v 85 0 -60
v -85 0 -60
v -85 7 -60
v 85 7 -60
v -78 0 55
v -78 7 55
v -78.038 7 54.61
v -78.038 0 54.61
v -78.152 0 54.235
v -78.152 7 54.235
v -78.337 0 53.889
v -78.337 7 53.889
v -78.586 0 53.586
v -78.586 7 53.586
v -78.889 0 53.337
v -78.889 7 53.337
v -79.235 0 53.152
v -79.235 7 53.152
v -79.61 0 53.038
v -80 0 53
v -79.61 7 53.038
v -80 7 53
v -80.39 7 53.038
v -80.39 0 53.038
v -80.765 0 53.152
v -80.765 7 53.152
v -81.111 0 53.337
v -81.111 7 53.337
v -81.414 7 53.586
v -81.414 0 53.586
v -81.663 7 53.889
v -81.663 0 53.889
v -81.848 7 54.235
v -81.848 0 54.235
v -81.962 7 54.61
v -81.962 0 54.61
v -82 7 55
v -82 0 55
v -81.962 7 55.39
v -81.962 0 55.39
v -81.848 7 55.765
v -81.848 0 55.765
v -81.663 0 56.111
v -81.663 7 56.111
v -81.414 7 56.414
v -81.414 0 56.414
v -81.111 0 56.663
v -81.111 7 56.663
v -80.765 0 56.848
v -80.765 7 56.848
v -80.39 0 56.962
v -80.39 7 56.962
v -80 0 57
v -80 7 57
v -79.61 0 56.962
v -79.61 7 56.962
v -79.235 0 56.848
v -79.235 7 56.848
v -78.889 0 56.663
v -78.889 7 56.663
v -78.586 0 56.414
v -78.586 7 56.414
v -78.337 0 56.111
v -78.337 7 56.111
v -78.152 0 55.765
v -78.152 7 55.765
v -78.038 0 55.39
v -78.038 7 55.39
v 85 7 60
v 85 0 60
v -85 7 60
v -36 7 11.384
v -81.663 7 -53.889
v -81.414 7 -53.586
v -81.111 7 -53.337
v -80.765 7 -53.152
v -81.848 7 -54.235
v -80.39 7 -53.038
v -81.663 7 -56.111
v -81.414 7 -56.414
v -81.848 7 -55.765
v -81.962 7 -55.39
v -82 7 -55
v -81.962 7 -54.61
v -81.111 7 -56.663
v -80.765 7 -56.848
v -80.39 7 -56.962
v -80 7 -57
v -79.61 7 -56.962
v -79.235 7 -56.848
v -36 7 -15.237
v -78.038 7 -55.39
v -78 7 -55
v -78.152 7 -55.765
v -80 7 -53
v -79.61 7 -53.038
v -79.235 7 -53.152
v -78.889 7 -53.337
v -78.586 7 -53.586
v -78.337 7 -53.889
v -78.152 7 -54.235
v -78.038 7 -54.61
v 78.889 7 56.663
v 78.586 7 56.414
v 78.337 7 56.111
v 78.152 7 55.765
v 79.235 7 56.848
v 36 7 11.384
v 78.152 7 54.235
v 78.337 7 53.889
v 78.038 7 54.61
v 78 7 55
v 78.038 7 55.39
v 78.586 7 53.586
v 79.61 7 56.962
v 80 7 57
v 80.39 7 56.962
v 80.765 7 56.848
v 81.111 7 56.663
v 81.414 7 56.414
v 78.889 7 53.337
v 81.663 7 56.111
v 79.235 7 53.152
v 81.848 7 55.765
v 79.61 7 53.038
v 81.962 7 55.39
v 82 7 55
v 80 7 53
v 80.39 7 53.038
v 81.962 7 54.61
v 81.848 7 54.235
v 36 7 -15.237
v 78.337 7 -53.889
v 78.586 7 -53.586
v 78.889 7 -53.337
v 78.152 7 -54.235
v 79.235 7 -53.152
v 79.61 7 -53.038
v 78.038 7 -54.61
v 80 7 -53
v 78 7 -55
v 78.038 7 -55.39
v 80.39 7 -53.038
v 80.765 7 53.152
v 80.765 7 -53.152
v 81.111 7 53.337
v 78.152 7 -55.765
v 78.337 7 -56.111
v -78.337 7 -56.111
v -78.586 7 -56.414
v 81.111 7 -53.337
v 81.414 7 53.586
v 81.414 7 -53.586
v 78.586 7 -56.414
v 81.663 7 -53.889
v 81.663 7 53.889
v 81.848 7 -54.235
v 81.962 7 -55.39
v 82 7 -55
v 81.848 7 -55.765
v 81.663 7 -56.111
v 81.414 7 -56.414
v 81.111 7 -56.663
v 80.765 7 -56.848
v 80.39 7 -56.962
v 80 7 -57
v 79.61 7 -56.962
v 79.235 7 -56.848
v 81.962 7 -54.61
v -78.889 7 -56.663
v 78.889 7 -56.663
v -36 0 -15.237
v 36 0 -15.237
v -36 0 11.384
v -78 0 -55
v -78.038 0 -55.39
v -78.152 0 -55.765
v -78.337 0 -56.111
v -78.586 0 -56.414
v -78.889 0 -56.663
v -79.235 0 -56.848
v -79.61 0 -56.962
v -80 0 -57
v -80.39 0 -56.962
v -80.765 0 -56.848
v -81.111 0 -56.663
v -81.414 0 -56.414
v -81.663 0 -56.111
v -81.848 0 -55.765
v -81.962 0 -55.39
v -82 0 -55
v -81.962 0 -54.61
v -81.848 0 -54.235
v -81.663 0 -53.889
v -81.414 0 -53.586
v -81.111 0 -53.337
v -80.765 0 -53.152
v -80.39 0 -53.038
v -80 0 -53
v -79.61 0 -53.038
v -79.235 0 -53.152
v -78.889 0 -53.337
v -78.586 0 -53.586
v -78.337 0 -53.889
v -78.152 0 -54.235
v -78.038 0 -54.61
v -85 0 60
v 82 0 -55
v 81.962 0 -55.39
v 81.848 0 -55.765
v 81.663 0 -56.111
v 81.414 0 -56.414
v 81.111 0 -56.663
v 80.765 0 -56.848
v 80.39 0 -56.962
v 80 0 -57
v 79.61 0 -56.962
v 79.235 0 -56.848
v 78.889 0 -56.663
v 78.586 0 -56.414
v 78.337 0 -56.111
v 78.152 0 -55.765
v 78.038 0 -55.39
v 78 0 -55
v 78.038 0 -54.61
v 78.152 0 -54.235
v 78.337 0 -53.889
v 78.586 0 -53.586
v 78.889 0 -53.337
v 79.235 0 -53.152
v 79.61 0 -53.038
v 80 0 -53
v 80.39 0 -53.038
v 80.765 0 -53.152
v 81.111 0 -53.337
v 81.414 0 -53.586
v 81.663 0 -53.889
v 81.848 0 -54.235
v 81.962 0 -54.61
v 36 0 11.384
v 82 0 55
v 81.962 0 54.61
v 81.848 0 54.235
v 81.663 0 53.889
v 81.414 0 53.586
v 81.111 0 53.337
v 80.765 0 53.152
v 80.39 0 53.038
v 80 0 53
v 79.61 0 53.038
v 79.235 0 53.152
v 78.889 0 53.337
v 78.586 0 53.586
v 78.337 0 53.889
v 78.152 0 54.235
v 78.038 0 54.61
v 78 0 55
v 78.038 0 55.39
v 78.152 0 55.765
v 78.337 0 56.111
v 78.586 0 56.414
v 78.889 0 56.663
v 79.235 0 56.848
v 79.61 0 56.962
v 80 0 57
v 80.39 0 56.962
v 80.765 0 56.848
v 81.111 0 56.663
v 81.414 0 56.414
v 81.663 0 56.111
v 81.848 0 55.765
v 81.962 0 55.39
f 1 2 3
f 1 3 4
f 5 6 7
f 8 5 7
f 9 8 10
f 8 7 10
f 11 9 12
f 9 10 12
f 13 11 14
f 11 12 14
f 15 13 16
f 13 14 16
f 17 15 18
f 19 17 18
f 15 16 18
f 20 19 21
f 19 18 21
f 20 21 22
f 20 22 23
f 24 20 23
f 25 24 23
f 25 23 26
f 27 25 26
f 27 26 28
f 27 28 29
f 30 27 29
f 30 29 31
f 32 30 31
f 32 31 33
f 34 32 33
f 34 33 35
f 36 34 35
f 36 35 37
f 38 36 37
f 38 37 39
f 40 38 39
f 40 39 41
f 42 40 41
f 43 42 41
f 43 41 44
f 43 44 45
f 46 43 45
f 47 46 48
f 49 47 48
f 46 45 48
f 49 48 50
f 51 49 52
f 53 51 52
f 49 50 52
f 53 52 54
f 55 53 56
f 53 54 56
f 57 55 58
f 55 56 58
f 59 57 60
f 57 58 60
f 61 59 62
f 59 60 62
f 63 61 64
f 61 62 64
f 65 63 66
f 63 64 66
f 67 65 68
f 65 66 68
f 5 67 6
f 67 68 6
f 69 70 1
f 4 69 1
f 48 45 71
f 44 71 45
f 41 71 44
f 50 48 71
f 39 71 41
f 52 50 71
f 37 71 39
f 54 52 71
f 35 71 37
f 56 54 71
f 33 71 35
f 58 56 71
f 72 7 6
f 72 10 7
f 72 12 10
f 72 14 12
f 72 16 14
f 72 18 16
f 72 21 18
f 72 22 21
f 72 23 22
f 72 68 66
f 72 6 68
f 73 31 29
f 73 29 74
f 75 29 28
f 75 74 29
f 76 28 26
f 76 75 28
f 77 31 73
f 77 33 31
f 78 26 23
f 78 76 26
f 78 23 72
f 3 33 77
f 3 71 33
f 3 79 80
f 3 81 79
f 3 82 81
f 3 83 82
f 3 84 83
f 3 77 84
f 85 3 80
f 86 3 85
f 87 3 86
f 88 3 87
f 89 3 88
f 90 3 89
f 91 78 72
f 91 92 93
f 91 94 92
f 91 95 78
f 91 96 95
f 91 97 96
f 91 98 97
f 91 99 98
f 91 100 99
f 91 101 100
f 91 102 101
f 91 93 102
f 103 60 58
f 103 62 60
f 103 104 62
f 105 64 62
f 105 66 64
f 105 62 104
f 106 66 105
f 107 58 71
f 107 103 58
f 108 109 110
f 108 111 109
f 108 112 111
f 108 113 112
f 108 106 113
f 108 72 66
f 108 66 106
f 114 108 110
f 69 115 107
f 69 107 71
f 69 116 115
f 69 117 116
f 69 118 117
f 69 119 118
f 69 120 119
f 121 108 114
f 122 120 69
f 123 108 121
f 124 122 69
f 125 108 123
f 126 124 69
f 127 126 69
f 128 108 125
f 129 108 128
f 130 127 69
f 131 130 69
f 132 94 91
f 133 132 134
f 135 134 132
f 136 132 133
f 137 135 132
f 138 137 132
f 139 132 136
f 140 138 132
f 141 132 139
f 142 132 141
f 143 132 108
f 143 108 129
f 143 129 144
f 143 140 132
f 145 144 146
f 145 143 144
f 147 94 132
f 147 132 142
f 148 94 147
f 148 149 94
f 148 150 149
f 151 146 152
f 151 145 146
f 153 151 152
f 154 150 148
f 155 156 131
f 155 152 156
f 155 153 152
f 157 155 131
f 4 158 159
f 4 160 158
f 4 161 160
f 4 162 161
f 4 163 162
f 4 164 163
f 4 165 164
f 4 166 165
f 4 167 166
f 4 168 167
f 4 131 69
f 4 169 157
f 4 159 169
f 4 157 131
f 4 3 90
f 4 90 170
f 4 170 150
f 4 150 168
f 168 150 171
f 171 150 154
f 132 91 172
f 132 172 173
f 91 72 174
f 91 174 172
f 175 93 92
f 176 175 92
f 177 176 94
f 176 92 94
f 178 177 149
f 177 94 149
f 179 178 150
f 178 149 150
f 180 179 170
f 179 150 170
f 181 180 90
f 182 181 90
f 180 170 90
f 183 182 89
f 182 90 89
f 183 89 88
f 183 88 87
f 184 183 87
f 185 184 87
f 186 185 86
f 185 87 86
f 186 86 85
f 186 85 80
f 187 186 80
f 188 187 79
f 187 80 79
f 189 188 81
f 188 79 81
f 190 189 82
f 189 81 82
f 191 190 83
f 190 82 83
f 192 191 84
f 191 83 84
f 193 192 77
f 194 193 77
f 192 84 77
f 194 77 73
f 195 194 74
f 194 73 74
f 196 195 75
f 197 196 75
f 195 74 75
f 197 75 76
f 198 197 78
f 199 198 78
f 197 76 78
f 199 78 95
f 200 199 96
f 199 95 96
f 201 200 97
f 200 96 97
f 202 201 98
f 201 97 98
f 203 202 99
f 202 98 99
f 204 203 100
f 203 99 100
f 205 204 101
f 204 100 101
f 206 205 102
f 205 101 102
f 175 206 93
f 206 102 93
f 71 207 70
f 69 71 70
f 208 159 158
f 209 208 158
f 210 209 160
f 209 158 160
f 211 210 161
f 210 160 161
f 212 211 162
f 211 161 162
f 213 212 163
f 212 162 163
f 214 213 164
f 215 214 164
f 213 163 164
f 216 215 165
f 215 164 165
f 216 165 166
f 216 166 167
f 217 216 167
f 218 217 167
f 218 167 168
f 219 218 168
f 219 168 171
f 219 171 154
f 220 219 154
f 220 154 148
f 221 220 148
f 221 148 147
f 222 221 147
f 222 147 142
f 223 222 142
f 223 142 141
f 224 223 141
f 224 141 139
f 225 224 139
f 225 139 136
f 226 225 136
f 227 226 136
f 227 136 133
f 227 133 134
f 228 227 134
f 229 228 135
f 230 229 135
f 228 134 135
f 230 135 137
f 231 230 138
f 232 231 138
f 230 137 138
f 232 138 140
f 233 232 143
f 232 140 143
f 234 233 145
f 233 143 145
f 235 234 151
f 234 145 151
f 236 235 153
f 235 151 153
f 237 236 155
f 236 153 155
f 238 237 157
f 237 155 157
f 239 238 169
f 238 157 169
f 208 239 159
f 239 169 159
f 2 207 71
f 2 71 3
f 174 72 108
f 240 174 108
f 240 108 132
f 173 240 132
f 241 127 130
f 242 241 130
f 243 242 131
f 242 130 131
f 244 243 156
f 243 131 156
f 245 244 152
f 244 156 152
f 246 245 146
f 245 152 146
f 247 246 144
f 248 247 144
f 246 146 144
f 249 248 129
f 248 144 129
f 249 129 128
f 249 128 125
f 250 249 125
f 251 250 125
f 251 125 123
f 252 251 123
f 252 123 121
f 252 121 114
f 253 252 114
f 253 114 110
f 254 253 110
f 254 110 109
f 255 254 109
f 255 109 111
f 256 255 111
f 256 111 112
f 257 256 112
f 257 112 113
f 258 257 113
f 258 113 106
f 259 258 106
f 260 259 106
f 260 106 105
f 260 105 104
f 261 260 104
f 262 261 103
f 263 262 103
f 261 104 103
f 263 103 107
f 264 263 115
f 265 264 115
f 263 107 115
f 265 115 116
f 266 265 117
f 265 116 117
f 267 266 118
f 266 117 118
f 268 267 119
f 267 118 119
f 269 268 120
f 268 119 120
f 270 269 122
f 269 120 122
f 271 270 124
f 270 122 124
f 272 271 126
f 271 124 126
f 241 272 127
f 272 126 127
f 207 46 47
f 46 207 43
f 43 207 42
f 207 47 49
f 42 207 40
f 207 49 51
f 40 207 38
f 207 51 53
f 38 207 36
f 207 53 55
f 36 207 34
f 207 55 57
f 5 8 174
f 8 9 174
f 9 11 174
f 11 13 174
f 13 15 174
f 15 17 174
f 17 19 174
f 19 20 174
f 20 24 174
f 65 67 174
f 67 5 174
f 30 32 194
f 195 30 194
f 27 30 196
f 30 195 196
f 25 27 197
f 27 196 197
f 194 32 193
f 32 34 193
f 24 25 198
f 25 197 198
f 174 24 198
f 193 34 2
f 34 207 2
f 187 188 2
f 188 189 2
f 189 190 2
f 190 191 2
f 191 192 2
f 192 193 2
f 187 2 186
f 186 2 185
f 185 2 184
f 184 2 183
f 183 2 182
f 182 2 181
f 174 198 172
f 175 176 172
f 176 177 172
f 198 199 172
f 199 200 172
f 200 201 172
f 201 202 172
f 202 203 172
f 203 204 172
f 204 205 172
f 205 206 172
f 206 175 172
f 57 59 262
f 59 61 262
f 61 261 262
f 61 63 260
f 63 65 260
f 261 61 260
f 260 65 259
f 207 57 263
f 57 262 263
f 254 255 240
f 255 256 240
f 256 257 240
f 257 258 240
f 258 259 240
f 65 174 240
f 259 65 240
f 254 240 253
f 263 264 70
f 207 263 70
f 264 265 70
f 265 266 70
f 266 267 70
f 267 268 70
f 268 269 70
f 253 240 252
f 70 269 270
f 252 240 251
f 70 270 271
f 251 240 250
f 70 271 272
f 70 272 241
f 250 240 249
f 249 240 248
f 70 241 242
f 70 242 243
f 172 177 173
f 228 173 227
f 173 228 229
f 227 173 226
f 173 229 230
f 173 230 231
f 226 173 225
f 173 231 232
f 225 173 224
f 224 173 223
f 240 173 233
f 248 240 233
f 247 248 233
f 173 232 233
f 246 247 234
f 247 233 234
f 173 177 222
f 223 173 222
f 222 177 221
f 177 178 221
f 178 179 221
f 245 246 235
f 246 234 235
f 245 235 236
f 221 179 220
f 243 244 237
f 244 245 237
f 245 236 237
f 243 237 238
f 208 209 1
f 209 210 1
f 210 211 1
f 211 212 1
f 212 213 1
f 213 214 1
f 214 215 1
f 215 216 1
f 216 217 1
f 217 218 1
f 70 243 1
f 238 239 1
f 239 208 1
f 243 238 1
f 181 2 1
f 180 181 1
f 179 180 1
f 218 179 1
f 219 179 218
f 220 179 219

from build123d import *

# Parameters (mm, degrees)
SKETCH1_W           = 170
SKETCH1_H           = 120
BOSS_EXTRUDE1_DEPTH = 7
SKETCH2_W           = 72
SKETCH2_H           = 26.620567464
CUT_EXTRUDE1_DEPTH  = 7
SKETCH3_R           = 2
CUT_EXTRUDE5_DEPTH  = 7
SKETCH7_R           = 2
CUT_EXTRUDE7_DEPTH  = 10
SKETCH6_R           = 2
CUT_EXTRUDE10_DEPTH = 10
SKETCH9_R           = 2
CUT_EXTRUDE11_DEPTH = 10


with BuildPart() as part:
    # Sketch1 → Boss-Extrude1 (new body)
    with BuildSketch(Plane(origin=(0, 0, 0), x_dir=(1, 0, 0), z_dir=(0, 1, 0))):
        Rectangle(SKETCH1_W, SKETCH1_H)
    extrude(amount=BOSS_EXTRUDE1_DEPTH)

    # Sketch2 → Cut-Extrude1 (cut)
    with BuildSketch(Plane(origin=(0, 7, 0), x_dir=(1, 0, 0), z_dir=(0, 1, 0))):
        with Locations((0, 1.926488435)):
            Rectangle(SKETCH2_W, SKETCH2_H)
    extrude(amount=-CUT_EXTRUDE1_DEPTH, mode=Mode.SUBTRACT)

    # Sketch3 → Cut-Extrude5 (cut)
    with BuildSketch(Plane(origin=(0, 7, 0), x_dir=(1, 0, 0), z_dir=(0, 1, 0))):
        with Locations((-80, 55)):
            Circle(SKETCH3_R)
    extrude(amount=-CUT_EXTRUDE5_DEPTH, mode=Mode.SUBTRACT)

    # Sketch7 → Cut-Extrude7 (cut)
    with BuildSketch(Plane(origin=(0, 7, 0), x_dir=(1, 0, 0), z_dir=(0, 1, 0))):
        with Locations((-80, -55)):
            Circle(SKETCH7_R)
    extrude(amount=-CUT_EXTRUDE7_DEPTH, mode=Mode.SUBTRACT)

    # Sketch6 → Cut-Extrude10 (cut)
    with BuildSketch(Plane(origin=(0, 7, 0), x_dir=(1, 0, 0), z_dir=(0, 1, 0))):
        with Locations((80, 55)):
            Circle(SKETCH6_R)
    extrude(amount=-CUT_EXTRUDE10_DEPTH, mode=Mode.SUBTRACT)

    # Sketch9 → Cut-Extrude11 (cut)
    with BuildSketch(Plane(origin=(0, 7, 0), x_dir=(1, 0, 0), z_dir=(0, 1, 0))):
        with Locations((80, -55)):
            Circle(SKETCH9_R)
    extrude(amount=-CUT_EXTRUDE11_DEPTH, mode=Mode.SUBTRACT)


solid = part.part
